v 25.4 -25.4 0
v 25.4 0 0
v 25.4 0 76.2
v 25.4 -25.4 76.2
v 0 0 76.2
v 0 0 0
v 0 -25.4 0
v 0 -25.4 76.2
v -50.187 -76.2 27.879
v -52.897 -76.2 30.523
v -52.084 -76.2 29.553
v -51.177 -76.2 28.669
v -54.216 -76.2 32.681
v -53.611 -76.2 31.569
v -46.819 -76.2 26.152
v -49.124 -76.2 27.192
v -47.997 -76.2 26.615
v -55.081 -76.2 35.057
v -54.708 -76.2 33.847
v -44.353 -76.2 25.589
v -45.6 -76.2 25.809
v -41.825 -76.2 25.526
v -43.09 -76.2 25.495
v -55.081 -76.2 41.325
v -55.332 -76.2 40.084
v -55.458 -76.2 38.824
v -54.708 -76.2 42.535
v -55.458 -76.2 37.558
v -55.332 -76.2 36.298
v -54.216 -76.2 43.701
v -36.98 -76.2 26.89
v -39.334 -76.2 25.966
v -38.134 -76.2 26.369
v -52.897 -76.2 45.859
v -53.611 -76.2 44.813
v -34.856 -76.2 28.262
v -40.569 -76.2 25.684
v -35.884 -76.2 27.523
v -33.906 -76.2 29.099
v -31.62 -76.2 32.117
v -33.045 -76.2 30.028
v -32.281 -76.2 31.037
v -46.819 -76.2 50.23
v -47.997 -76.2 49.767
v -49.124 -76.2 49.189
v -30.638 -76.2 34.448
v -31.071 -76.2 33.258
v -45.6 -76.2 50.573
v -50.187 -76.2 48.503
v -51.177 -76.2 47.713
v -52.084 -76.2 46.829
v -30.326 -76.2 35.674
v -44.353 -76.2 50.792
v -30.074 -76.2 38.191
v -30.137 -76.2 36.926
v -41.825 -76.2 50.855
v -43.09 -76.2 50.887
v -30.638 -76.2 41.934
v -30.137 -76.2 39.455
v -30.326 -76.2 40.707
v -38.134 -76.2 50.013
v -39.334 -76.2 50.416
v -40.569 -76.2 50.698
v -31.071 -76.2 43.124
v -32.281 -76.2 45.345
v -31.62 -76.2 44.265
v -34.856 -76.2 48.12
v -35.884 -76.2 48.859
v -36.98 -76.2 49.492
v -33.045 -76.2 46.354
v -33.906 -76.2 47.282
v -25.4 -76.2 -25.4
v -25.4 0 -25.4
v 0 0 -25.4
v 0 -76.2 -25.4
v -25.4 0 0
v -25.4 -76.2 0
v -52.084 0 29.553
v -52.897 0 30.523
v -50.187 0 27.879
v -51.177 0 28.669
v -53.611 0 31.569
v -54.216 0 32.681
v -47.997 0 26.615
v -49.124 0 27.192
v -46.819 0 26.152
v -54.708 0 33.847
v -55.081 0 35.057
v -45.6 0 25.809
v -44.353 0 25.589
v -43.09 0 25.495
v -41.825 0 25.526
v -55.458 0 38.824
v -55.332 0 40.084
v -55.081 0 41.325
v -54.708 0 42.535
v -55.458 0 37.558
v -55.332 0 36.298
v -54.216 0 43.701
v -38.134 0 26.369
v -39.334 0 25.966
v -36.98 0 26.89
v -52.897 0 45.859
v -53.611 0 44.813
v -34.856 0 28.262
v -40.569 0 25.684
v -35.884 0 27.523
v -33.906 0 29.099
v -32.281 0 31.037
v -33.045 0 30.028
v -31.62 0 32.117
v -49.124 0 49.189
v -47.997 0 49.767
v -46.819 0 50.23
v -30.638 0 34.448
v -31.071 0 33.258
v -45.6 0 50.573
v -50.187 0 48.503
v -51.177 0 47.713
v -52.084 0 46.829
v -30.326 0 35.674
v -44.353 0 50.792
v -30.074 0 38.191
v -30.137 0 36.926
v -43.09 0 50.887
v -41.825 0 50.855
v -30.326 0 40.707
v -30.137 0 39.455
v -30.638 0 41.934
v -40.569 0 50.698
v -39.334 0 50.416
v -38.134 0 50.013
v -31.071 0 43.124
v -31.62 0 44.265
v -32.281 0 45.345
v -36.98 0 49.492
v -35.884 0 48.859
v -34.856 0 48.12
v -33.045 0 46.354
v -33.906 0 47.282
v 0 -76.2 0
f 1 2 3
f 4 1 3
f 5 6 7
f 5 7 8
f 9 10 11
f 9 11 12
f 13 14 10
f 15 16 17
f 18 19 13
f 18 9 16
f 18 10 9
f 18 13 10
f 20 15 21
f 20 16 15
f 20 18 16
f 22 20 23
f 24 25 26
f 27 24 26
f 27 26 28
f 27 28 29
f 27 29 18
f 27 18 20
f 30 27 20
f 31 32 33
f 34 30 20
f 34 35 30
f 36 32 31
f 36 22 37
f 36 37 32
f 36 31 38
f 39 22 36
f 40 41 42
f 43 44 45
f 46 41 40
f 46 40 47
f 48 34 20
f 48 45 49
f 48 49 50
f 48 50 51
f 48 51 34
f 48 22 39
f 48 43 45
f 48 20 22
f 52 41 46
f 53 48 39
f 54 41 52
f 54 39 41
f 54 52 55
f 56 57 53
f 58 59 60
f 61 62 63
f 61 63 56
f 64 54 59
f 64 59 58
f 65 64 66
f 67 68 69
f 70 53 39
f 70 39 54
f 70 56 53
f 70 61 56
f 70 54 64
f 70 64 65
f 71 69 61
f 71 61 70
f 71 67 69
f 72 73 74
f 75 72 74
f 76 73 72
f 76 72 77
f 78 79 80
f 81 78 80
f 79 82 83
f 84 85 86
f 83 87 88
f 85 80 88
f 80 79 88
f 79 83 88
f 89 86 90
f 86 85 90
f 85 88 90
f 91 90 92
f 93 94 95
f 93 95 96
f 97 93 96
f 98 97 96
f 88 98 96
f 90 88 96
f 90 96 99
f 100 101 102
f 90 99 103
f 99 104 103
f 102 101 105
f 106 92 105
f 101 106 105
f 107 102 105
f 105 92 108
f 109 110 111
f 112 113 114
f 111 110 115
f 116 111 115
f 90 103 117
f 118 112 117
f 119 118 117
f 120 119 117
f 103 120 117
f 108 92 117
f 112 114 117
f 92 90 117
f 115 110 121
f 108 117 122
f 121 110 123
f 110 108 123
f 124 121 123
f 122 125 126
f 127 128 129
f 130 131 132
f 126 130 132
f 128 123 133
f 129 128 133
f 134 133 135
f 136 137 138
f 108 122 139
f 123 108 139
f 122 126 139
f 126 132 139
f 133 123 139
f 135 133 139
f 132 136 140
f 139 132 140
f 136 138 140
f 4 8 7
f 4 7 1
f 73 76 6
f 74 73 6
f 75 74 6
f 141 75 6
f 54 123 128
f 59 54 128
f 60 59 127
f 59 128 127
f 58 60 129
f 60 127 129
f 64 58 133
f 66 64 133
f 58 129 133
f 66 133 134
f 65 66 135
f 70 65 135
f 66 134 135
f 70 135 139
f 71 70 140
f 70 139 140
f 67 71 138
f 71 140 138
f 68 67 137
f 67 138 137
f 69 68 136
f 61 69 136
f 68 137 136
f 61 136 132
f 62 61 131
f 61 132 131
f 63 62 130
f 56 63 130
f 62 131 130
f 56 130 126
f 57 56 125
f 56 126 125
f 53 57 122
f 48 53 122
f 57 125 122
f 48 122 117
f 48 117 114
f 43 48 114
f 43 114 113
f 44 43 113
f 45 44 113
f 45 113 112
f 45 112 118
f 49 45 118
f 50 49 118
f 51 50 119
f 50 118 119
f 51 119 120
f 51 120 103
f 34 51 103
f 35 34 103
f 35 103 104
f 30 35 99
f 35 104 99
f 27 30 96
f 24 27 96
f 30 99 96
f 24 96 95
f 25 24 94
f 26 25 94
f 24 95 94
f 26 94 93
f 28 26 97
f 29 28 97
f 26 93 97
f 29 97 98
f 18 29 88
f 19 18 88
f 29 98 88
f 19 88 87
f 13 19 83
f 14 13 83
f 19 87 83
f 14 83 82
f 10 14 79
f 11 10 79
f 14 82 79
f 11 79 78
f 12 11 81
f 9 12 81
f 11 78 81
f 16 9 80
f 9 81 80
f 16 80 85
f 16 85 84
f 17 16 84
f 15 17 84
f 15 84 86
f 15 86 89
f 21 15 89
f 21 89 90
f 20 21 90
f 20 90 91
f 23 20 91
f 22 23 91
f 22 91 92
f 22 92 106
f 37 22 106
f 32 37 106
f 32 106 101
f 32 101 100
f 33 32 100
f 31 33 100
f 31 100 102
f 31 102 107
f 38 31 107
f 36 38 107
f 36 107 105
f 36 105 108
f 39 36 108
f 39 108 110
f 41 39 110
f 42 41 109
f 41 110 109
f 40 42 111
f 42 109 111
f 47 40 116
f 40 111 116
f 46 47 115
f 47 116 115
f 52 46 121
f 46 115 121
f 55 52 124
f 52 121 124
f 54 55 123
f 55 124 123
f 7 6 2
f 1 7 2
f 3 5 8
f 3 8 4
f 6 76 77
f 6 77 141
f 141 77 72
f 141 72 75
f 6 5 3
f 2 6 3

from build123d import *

# Parameters (mm, degrees)
F0_W     = 25.4
F0_H     = 76.2
F1_DEPTH = 25.4
F2_R     = 12.7
F3_DEPTH = 76.2
F4_W     = 25.4
F4_H     = 25.4
F5_DEPTH = 76.2


with BuildPart() as f1:
    # F0 (on Front) → F1 (new body)
    with BuildSketch(Plane.XZ):
        with Locations((12.7, 38.1)):
            Rectangle(F0_W, F0_H)
    extrude(amount=F1_DEPTH)


with BuildPart() as f3:
    # F2 (on Front) → F3 (new body)
    with BuildSketch(Plane.XZ):
        with Locations((-42.773843, 38.190931)):
            Circle(F2_R)
    extrude(amount=F3_DEPTH)


with BuildPart() as f5:
    # F4 (on Front) → F5 (new body)
    with BuildSketch(Plane.XZ):
        with Locations((-12.7, -12.7)):
            Rectangle(F4_W, F4_H)
    extrude(amount=F5_DEPTH)


solid = Compound([f1.part, f3.part, f5.part])
